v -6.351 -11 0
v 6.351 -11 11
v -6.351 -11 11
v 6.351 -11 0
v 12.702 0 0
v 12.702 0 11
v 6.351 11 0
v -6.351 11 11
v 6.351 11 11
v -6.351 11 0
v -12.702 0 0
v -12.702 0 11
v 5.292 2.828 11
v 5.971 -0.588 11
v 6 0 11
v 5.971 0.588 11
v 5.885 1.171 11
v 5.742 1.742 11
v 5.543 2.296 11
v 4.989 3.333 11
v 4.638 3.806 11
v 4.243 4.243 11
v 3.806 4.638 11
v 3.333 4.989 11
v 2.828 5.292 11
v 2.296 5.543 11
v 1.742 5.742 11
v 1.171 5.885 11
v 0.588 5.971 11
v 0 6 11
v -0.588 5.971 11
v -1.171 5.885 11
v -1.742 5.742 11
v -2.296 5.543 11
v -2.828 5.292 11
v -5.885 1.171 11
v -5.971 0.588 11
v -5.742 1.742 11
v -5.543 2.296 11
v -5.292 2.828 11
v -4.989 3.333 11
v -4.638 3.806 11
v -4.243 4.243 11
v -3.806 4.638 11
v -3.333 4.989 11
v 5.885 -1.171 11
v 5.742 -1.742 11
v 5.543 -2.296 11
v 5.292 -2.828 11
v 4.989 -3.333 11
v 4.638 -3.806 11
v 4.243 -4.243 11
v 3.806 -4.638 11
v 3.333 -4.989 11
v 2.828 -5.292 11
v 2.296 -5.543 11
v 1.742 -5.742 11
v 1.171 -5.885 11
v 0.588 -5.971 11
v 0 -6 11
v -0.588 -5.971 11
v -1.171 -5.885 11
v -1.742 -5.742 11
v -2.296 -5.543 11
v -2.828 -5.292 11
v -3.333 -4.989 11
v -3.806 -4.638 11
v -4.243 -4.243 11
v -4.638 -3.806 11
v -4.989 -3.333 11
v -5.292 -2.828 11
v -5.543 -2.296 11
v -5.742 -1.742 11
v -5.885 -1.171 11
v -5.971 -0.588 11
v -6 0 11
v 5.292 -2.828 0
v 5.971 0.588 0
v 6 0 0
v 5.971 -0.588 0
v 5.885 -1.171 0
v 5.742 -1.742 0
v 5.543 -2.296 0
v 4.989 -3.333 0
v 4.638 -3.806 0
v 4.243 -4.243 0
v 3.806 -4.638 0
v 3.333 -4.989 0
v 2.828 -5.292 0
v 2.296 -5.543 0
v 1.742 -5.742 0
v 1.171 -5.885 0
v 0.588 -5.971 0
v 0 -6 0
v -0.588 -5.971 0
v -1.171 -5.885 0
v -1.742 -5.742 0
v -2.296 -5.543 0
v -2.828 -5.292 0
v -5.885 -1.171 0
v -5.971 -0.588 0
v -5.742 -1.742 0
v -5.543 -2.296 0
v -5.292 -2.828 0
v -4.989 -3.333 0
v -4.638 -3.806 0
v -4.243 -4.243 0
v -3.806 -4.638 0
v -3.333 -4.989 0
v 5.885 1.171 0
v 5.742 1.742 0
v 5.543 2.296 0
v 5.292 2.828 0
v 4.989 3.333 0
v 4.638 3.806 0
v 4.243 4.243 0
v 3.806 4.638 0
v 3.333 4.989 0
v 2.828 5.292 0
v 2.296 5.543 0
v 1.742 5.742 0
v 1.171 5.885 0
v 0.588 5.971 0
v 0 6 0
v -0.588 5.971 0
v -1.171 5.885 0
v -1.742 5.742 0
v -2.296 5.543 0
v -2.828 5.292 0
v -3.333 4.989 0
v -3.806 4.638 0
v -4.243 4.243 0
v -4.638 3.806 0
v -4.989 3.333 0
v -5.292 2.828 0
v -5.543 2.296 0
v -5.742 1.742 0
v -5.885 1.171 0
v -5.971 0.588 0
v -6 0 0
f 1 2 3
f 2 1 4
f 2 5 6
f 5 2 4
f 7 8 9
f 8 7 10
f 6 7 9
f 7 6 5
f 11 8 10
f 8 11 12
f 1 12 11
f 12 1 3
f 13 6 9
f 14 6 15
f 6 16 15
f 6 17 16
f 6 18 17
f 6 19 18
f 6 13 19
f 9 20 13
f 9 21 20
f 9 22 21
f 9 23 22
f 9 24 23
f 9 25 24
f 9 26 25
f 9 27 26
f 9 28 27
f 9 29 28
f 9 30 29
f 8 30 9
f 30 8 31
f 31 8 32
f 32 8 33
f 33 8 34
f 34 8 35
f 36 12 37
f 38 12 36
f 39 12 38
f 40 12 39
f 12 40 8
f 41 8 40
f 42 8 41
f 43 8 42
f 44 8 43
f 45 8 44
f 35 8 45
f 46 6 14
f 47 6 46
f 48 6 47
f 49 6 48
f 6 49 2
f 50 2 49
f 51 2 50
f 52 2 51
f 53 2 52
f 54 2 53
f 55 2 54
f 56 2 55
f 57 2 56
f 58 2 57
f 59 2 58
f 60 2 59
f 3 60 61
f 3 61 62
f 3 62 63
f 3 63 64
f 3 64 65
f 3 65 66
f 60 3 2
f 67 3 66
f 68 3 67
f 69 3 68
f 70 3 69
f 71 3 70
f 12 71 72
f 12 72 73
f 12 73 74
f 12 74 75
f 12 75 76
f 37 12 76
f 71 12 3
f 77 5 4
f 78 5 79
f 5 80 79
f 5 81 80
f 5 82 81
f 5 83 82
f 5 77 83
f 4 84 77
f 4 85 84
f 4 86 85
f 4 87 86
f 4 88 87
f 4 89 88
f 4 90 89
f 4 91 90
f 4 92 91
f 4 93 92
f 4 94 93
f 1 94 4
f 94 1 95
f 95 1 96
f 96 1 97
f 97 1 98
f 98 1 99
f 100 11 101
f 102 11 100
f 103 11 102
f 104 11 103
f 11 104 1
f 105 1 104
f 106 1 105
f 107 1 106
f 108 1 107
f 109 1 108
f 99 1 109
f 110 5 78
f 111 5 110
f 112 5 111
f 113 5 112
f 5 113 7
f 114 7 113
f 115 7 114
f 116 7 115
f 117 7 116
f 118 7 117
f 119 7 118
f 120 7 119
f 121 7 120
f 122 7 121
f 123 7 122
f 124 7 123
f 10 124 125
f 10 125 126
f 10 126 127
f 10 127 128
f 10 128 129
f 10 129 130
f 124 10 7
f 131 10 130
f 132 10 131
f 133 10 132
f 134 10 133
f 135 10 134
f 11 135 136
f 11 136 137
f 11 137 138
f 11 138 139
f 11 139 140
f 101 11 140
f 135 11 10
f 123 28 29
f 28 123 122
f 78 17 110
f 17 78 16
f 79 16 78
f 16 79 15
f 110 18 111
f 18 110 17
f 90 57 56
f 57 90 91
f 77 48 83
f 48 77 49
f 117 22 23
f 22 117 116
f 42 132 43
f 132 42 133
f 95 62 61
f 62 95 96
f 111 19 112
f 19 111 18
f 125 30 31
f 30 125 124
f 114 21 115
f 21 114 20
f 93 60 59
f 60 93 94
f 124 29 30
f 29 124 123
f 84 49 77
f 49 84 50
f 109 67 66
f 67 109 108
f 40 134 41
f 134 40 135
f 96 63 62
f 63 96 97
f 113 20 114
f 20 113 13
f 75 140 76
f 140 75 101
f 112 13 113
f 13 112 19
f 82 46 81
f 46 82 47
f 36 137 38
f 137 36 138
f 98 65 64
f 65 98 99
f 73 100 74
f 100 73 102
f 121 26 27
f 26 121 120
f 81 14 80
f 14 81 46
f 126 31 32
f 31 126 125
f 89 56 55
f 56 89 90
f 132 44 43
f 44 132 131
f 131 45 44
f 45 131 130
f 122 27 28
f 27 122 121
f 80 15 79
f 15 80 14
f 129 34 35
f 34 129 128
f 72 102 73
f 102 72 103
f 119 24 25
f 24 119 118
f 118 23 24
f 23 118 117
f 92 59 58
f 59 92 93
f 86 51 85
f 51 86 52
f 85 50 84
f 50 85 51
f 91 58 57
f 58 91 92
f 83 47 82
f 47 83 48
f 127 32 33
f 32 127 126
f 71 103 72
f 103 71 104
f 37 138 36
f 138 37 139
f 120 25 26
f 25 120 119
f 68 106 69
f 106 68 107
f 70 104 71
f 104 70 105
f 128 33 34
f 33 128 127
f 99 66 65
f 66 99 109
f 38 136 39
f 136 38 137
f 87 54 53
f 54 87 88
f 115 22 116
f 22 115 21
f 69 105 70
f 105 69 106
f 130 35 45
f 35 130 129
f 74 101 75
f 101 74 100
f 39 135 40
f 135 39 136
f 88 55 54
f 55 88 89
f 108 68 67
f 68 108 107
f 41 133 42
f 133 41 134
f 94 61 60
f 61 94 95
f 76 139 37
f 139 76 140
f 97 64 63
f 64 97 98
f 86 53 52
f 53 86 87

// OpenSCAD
// Parametric hex nut — trig, $fn override per-call, diameter args, function
$fn = 64;

function flat2rad(af) = af / 2 / cos(30);   // across-flats -> circumradius

module nut(af = 16, h = 8, hole = 8) {
    difference() {
        cylinder(h = h, r = flat2rad(af), $fn = 6);      // hex prism
        translate([0, 0, -1]) cylinder(h = h + 2, d = hole);
    }
}

nut(af = 22, h = 11, hole = 12);
